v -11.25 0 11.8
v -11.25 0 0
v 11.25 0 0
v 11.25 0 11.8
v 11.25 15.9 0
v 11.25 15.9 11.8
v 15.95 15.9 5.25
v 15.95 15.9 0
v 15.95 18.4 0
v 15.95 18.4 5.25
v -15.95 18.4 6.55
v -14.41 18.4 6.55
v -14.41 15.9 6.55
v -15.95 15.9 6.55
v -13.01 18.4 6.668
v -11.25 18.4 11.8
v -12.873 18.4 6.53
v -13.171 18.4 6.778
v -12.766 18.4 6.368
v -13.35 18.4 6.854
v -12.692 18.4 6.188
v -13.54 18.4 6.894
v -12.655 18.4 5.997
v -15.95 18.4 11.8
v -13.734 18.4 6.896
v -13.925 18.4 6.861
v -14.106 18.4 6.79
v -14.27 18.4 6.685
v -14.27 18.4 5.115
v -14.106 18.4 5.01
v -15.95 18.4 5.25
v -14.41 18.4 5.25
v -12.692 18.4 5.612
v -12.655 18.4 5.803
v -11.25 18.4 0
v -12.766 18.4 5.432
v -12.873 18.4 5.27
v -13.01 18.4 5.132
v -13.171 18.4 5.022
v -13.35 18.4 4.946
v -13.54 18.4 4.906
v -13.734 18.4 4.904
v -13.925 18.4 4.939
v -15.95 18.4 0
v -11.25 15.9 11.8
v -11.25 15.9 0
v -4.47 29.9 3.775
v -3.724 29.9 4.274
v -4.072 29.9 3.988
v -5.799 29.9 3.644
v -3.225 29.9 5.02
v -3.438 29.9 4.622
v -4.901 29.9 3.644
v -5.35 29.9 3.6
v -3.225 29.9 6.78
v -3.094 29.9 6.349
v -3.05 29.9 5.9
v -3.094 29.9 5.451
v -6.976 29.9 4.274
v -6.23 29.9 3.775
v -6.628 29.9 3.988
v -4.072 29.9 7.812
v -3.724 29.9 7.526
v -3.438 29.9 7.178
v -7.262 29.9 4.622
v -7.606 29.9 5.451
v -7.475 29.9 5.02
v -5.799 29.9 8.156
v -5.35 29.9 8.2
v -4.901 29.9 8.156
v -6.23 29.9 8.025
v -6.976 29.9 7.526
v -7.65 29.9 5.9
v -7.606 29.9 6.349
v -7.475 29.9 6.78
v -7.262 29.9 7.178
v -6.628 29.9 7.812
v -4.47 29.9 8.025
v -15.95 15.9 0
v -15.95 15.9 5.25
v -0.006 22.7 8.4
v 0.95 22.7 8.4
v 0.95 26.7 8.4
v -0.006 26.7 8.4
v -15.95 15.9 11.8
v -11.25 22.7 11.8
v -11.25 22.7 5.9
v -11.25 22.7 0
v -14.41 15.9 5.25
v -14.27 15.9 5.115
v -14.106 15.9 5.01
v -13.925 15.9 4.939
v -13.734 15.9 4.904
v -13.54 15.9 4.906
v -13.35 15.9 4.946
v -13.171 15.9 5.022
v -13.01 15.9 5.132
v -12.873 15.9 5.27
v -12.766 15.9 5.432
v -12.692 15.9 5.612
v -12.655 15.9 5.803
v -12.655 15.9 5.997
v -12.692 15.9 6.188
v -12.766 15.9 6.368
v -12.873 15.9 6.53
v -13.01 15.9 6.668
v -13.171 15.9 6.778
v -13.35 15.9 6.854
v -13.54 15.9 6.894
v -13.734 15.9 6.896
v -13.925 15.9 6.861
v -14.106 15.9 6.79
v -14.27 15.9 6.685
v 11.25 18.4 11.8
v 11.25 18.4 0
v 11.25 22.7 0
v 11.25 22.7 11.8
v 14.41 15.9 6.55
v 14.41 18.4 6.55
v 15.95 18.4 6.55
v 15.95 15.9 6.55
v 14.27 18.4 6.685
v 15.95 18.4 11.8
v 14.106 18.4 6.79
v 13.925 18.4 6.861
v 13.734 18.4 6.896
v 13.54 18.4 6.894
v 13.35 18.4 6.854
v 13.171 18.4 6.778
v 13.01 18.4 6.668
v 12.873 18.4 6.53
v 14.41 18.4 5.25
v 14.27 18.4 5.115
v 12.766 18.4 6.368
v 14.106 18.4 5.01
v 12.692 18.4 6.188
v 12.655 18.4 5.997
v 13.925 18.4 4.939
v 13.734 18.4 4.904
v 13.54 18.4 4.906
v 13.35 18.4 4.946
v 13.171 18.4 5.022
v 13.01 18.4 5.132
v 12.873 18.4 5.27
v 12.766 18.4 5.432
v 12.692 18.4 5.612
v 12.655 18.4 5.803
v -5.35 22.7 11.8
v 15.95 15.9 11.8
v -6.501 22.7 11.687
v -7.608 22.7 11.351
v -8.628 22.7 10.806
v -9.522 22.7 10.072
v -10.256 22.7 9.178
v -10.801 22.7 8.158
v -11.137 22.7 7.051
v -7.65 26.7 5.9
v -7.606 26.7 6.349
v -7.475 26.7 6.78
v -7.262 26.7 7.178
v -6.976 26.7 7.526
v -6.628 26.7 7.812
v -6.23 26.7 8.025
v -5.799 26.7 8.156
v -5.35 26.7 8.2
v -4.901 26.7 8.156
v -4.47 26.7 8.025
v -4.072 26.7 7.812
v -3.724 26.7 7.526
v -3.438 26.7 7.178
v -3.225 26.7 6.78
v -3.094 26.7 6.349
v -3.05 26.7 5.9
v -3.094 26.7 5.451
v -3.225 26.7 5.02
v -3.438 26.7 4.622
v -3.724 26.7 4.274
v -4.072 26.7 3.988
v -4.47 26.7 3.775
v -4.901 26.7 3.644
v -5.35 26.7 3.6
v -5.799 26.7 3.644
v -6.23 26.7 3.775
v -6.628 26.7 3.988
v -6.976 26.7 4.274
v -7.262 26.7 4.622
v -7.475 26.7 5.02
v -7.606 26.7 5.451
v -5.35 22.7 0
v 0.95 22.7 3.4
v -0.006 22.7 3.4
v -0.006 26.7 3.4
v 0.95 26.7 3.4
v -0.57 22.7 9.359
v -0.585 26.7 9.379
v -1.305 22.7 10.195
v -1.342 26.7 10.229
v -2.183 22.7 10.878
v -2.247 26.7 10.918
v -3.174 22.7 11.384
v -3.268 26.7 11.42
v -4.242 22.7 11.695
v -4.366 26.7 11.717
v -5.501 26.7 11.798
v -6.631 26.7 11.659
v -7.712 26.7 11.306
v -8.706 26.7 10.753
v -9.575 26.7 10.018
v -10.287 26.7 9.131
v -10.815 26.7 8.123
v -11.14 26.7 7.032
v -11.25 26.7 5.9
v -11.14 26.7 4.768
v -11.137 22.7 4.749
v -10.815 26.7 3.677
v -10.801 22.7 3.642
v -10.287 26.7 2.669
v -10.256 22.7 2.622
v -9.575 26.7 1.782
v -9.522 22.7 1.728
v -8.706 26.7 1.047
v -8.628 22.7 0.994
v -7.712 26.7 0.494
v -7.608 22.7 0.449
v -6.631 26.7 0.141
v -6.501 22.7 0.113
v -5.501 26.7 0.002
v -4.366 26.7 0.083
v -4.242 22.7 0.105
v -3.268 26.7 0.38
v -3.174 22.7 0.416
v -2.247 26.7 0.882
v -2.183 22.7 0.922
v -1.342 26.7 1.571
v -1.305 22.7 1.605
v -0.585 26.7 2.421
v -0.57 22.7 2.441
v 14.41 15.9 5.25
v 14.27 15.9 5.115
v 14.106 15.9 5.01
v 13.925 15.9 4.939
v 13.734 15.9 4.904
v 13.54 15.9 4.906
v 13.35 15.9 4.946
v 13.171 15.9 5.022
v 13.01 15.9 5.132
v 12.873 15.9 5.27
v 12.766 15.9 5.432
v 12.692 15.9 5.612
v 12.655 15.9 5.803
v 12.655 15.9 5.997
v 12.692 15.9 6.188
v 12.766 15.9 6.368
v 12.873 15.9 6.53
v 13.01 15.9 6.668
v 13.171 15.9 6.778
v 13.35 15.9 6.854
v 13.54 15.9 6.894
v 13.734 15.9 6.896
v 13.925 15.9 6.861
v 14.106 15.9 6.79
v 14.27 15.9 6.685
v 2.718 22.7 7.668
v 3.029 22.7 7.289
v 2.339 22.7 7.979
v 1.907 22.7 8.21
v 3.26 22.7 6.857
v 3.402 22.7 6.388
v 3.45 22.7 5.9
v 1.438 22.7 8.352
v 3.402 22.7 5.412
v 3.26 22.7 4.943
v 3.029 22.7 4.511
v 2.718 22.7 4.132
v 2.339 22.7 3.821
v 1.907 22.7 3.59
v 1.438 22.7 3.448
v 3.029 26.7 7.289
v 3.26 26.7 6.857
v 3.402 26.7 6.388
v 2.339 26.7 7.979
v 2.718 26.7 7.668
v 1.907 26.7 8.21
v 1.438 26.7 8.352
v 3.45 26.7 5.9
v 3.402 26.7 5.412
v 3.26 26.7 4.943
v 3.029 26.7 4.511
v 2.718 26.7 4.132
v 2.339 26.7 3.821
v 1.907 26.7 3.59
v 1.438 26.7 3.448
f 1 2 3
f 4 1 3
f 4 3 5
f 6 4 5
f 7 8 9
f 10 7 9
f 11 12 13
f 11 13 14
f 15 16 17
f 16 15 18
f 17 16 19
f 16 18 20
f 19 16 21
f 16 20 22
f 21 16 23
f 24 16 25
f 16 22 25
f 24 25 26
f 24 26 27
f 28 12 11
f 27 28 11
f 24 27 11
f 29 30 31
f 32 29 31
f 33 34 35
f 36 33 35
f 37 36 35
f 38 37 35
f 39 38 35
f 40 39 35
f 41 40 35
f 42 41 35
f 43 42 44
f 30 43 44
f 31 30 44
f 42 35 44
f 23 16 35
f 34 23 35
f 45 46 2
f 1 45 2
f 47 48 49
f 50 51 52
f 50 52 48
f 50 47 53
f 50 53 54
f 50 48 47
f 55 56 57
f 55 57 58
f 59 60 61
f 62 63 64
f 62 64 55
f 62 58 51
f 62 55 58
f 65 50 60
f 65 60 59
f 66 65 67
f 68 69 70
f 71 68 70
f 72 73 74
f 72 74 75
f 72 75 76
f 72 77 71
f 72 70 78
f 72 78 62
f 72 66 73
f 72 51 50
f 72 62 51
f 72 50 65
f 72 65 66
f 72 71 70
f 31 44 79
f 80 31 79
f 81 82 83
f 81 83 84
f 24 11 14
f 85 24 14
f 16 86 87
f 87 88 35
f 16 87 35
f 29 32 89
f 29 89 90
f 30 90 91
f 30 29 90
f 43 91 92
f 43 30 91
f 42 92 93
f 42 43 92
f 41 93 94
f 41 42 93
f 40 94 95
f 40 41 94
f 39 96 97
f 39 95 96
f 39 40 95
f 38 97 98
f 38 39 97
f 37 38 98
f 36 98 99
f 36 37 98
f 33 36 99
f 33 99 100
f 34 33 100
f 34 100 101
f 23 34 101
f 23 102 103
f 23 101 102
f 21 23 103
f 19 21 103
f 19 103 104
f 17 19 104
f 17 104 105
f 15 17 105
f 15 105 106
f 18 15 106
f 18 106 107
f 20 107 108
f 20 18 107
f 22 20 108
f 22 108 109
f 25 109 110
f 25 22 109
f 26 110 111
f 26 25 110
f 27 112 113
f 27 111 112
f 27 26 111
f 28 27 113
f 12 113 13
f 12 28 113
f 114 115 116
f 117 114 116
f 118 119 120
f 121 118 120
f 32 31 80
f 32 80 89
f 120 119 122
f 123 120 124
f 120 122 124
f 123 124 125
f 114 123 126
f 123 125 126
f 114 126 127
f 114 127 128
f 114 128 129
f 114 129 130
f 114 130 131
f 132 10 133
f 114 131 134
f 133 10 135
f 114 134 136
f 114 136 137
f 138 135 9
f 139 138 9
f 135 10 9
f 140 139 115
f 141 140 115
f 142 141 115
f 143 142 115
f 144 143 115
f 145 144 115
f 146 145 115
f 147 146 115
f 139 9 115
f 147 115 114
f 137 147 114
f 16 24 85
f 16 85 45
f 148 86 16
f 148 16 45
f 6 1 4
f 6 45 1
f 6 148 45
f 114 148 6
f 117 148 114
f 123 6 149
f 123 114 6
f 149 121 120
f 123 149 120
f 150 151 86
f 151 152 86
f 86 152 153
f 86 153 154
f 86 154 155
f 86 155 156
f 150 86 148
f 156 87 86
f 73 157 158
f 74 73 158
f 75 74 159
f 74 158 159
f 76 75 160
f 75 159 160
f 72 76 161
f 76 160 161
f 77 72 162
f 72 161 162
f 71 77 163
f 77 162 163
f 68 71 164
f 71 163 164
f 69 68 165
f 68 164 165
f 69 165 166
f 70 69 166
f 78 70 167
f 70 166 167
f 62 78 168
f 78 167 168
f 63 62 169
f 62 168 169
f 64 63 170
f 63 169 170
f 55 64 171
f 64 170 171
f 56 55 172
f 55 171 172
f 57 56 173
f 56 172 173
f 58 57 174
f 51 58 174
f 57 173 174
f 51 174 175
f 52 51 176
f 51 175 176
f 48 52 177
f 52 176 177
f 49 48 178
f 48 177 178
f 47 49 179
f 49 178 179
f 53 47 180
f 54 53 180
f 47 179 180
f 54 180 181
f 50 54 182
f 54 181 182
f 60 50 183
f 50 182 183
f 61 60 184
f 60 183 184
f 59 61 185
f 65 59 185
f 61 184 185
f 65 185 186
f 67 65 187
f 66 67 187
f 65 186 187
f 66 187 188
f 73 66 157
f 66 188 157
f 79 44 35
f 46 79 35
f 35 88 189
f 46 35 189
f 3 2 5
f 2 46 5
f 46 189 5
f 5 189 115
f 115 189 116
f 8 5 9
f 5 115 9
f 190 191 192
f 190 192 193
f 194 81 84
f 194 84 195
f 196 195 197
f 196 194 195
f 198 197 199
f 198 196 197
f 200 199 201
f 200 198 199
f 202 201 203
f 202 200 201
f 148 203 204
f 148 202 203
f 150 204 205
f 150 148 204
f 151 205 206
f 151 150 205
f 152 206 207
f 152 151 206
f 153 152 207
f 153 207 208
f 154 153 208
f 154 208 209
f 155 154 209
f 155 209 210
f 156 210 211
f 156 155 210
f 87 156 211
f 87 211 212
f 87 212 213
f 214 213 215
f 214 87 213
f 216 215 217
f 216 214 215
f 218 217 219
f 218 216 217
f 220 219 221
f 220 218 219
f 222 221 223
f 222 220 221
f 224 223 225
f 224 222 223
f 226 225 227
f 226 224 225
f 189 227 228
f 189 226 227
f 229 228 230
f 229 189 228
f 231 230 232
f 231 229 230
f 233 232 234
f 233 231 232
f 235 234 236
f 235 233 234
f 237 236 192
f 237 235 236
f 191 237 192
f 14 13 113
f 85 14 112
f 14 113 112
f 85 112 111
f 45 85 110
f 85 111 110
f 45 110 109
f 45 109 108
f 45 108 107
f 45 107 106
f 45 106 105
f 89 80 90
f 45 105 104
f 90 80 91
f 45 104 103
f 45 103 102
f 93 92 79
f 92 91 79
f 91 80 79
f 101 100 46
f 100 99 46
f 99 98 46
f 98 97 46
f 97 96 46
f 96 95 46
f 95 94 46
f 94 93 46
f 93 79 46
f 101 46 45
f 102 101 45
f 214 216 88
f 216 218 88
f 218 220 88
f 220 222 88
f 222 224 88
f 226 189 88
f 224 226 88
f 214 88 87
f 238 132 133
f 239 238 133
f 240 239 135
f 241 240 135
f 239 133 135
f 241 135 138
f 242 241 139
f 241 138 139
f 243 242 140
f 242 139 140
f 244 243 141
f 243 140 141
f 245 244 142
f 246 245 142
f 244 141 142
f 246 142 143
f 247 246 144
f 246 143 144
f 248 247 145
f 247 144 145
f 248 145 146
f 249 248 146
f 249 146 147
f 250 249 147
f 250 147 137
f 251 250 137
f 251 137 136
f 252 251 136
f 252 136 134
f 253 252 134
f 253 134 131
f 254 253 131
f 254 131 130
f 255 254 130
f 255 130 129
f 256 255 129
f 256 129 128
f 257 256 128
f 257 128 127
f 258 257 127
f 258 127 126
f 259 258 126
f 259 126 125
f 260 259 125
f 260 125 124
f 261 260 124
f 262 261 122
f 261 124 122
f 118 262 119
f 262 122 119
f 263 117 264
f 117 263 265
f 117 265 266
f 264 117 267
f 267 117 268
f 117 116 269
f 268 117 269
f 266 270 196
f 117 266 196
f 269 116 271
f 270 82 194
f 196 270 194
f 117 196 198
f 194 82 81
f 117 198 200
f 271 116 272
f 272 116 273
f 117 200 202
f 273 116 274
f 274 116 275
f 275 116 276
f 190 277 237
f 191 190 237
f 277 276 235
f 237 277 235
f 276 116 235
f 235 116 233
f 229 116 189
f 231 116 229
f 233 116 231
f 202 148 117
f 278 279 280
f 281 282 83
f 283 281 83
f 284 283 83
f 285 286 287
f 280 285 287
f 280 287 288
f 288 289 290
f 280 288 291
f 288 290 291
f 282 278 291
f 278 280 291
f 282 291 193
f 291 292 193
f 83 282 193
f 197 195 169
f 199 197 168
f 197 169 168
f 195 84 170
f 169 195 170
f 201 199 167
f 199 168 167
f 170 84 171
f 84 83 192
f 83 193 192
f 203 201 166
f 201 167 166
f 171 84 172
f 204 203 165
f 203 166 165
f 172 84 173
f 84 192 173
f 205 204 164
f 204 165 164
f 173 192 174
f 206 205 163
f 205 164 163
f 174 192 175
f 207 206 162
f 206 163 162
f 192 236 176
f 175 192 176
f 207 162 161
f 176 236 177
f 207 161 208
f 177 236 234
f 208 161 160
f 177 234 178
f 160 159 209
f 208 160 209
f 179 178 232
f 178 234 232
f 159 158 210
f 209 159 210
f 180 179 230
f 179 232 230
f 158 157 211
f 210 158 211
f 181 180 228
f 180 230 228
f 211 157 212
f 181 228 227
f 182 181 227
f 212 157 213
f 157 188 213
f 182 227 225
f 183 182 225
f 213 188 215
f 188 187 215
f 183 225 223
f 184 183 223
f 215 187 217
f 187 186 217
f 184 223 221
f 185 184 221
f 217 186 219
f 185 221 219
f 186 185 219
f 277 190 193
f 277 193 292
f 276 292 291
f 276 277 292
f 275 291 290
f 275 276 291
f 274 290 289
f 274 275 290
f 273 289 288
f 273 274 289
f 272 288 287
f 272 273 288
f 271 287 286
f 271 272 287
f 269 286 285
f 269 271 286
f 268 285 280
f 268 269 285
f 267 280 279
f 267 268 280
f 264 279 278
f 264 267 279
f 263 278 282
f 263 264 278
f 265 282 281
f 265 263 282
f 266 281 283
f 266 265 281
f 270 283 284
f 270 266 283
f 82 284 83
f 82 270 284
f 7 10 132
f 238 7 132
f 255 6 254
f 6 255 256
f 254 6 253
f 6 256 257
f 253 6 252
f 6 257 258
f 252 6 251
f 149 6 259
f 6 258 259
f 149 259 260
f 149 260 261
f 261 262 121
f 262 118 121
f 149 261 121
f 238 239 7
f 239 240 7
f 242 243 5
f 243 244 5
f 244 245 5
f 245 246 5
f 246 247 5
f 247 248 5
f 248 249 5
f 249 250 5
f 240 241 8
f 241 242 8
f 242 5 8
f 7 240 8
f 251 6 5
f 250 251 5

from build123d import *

# Parameters (mm, degrees)
BOSS_EXTRUDE1_DEPTH = 11.8
BOSS_EXTRUDE2_DEPTH = 4
CUT_EXTRUDE1_DEPTH  = 31.148507426
SKETCH4_R           = 2.3
BOSS_EXTRUDE4_DEPTH = 3.2


with BuildPart() as part:
    # Sketch1 → Boss-Extrude1 (new body)
    with BuildSketch(Plane.XY):
        Polygon((-11.25, 0), (11.25, 0), (11.25, 15.9), (15.95, 15.9), (15.95, 18.4), (11.25, 18.4), (11.25, 22.7), (-11.25, 22.7), (-11.25, 18.4), (-15.95, 18.4), (-15.95, 15.9), (-11.25, 15.9), align=None)
    extrude(amount=BOSS_EXTRUDE1_DEPTH)

    # Sketch2 → Boss-Extrude2 (add)
    with BuildSketch(Plane(origin=(0, 22.7, 0), x_dir=(1, 0, 0), z_dir=(0, 1, 0))):
        with BuildLine():
            Line((0.95, -8.4), (-0.005844314, -8.4))
            ThreePointArc((-0.005844314, -8.4), (-11.25, -5.9), (-0.005844314, -3.4))
            Line((-0.005844314, -3.4), (0.95, -3.4))
            ThreePointArc((0.95, -3.4), (3.45, -5.9), (0.95, -8.4))
        make_face()
    extrude(amount=BOSS_EXTRUDE2_DEPTH)

    # Sketch3 → Cut-Extrude1 (cut, through all)
    with BuildSketch(Plane(origin=(0, 22.7, 0), x_dir=(1, 0, 0), z_dir=(0, 1, 0))):
        with BuildLine():
            Line((-15.95, -5.25), (-14.409934208, -5.25))
            ThreePointArc((-14.409934208, -5.25), (-12.65, -5.9), (-14.409934208, -6.55))
            Line((-14.409934208, -6.55), (-15.95, -6.55))
            Line((-15.95, -6.55), (-15.95, -5.25))
        make_face()
        with BuildLine():
            Line((15.95, -6.55), (15.95, -5.25))
            Line((15.95, -5.25), (14.409934208, -5.25))
            ThreePointArc((14.409934208, -5.25), (12.65, -5.9), (14.409934208, -6.55))
            Line((14.409934208, -6.55), (15.95, -6.55))
        make_face()
    extrude(amount=-CUT_EXTRUDE1_DEPTH, mode=Mode.SUBTRACT)

    # Sketch4 → Boss-Extrude4 (add)
    with BuildSketch(Plane(origin=(0, 26.7, 0), x_dir=(1, 0, 0), z_dir=(0, 1, 0))):
        with Locations(Location((-5.35, -5.9, 0), (0, 0, 180))):
            Circle(SKETCH4_R)
    extrude(amount=BOSS_EXTRUDE4_DEPTH)


solid = part.part
